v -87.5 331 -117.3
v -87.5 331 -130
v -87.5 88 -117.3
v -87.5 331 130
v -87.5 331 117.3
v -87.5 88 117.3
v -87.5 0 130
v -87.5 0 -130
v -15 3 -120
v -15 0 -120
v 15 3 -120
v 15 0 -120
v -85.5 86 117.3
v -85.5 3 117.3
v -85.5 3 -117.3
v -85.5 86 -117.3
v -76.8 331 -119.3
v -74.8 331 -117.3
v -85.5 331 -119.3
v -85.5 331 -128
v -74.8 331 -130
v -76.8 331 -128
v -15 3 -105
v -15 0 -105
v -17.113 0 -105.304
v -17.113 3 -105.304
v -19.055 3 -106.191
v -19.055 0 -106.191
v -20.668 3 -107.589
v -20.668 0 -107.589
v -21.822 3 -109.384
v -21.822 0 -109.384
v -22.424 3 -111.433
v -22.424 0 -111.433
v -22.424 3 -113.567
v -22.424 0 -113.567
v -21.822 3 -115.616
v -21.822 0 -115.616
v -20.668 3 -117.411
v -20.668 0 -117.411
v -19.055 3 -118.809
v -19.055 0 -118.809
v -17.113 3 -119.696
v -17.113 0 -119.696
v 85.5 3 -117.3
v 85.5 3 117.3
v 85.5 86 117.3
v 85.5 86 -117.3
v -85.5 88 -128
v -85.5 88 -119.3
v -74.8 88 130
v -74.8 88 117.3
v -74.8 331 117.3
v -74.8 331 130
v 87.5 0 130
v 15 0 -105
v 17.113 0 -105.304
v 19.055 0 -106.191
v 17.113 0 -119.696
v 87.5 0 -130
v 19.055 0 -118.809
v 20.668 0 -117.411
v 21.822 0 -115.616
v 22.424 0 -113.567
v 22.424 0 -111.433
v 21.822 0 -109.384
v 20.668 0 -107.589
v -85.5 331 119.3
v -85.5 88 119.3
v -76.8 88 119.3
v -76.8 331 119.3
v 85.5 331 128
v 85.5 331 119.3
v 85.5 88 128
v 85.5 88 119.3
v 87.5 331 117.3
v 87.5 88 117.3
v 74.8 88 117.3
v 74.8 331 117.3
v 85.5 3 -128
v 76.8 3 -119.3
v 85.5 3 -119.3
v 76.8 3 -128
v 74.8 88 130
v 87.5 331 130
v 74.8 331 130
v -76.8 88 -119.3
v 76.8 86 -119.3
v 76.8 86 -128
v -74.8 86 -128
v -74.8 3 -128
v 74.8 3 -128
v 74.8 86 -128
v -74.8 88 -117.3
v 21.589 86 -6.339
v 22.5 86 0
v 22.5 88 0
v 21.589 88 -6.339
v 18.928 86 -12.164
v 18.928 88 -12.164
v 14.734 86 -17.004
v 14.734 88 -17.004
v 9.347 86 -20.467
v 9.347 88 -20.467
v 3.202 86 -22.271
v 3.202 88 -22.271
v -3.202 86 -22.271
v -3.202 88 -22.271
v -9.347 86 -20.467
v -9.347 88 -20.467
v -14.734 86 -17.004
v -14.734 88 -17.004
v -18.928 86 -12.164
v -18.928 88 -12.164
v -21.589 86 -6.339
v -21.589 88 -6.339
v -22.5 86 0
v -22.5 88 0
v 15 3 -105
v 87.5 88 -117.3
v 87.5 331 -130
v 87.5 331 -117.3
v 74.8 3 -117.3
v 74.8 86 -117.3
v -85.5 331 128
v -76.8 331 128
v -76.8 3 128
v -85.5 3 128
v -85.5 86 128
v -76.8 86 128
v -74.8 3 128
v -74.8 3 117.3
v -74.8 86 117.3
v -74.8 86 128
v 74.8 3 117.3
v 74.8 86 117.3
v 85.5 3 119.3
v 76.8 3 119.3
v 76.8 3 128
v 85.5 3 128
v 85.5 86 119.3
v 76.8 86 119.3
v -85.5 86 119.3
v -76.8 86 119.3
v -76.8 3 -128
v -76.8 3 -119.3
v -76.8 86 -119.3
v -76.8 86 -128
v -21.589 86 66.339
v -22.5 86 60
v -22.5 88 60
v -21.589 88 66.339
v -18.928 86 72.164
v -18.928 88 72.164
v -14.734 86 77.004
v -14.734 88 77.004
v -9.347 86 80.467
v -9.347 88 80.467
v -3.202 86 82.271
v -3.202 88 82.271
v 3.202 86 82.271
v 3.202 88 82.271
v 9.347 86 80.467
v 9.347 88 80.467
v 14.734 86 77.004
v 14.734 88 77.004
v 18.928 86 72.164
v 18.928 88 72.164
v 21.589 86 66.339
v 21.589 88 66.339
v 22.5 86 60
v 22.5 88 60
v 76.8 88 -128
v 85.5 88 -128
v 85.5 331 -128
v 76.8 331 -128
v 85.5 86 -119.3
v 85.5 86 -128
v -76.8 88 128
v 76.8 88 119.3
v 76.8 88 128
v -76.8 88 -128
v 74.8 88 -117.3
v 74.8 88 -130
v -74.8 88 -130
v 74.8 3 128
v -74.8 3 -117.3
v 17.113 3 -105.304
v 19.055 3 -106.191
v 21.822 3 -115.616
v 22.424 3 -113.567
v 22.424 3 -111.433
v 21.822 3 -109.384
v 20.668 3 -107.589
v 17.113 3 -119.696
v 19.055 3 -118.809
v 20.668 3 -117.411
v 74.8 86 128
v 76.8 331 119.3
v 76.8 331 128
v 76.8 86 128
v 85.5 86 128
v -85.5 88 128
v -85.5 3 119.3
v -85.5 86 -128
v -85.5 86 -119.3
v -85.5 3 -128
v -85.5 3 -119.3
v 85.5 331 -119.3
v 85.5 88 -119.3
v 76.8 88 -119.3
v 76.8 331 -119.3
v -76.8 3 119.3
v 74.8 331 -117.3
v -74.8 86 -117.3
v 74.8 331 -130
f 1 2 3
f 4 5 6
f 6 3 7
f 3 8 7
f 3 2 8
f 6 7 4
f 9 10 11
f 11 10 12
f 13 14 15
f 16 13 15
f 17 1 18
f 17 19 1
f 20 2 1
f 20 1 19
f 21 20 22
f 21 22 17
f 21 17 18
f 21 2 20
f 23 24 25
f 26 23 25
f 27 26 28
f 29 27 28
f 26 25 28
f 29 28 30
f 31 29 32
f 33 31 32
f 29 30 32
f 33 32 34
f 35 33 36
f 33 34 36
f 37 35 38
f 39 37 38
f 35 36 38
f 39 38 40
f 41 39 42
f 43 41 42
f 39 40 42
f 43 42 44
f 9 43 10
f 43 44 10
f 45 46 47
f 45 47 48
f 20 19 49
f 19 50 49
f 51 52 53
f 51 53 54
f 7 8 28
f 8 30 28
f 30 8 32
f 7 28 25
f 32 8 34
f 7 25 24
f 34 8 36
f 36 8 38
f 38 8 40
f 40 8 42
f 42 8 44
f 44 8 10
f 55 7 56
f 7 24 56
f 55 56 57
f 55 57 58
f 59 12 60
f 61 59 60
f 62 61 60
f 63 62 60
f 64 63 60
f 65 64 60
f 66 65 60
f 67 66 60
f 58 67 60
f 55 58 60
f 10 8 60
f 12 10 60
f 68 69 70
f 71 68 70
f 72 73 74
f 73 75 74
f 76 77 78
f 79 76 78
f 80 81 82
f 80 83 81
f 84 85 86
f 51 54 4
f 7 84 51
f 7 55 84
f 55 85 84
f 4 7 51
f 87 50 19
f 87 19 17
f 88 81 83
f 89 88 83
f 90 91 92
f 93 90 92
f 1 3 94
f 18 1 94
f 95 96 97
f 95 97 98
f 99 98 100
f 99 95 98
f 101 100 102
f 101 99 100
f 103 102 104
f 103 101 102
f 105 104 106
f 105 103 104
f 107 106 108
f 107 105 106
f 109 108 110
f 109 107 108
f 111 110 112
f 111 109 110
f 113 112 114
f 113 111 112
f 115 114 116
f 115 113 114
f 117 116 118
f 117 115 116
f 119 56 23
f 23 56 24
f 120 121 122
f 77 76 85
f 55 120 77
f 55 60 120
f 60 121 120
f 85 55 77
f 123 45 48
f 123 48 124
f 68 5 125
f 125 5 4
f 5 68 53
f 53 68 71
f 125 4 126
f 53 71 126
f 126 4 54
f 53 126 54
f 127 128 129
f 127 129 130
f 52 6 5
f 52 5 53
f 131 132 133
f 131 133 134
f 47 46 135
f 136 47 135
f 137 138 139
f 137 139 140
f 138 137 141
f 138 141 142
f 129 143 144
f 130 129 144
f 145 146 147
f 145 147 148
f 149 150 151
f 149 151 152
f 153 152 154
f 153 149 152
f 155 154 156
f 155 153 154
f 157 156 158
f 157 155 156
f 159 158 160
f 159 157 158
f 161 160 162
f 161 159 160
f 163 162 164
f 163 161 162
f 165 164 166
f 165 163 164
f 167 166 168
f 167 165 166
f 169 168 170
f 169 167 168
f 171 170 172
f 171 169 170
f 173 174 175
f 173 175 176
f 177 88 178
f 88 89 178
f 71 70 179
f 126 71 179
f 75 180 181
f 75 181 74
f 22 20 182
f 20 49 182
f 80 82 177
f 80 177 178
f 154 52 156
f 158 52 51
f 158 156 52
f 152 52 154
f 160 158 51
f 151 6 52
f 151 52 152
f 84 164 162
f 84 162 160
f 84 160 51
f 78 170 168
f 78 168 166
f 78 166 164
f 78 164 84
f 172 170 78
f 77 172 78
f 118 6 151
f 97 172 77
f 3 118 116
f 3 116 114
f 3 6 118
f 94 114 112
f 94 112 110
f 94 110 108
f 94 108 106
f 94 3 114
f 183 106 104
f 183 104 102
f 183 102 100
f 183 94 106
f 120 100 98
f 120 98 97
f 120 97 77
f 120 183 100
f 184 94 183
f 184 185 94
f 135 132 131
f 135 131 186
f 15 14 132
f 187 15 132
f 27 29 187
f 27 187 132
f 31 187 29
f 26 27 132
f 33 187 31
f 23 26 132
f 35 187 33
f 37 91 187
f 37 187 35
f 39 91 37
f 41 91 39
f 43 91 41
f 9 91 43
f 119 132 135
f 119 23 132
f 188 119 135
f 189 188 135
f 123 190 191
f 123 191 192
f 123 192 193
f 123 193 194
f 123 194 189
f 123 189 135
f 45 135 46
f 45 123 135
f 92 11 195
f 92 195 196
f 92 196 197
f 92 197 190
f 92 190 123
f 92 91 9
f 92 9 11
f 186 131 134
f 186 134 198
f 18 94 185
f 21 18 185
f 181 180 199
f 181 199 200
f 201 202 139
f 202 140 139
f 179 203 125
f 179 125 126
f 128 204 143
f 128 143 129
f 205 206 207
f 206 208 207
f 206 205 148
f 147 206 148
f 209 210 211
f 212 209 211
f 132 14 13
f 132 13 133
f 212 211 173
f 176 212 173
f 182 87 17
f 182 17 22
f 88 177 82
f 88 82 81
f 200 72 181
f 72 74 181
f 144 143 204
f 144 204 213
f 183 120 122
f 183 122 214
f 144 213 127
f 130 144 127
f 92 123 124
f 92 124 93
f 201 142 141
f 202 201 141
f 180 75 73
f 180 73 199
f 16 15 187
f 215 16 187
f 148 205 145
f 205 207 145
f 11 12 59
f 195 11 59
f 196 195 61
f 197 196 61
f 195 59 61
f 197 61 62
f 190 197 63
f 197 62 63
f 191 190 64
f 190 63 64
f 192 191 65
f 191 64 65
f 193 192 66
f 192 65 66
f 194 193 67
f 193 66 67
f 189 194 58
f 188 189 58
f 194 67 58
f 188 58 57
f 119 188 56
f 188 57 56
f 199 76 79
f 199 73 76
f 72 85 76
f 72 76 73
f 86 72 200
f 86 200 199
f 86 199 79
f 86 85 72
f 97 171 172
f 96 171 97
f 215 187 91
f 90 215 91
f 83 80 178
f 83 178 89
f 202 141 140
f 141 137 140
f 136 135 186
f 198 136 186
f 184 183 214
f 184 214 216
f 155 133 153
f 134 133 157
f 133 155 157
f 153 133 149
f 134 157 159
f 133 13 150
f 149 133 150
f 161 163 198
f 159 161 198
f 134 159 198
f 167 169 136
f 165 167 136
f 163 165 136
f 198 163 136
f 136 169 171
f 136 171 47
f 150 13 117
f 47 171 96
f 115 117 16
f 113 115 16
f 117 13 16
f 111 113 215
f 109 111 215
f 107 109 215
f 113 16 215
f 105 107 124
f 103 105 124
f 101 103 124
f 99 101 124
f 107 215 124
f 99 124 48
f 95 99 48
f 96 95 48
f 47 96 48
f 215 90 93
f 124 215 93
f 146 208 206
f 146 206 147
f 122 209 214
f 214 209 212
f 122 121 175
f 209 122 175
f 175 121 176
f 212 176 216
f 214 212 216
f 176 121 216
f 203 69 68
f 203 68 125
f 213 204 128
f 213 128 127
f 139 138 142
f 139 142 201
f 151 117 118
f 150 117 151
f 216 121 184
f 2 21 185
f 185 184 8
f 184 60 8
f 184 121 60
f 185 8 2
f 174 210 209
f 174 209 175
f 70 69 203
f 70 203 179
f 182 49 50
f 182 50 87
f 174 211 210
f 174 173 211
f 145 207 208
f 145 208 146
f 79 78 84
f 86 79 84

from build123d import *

# Parameters (mm, degrees)
SKETCH1_W                 = 175
SKETCH1_H                 = 260
BOSS_EXTRUDE1_DEPTH       = 3
SKETCH3_W                 = 12.7
SKETCH3_H                 = 12.7
SKETCH3_W_2               = 8.7
SKETCH3_H_2               = 8.7
EXTRUDE_THIN1_DEPTH       = 328
MIRROR2_COPY_1_SKETCH_W   = 12.7
MIRROR2_COPY_1_SKETCH_H   = 12.7
MIRROR2_COPY_1_SKETCH_W_2 = 8.7
MIRROR2_COPY_1_SKETCH_H_2 = 8.7
MIRROR2_COPY_1_DEPTH      = 328
SKETCH5_W                 = 175
SKETCH5_H                 = 260
SKETCH5_W_2               = 171
SKETCH5_H_2               = 256
EXTRUDE_THIN2_DEPTH       = 83
SKETCH6_W                 = 175
SKETCH6_H                 = 260
BOSS_EXTRUDE2_DEPTH       = 2
SKETCH8_R                 = 22.5
CUT_EXTRUDE1_DEPTH        = 364.51100396
SKETCH9_R                 = 7.5
CUT_EXTRUDE2_DEPTH        = 3


with BuildPart() as part:
    # Sketch1 → Boss-Extrude1 (new body)
    with BuildSketch(Plane(origin=(0, 0, 0), x_dir=(1, 0, 0), z_dir=(0, 1, 0))):
        Rectangle(SKETCH1_W, SKETCH1_H)
    extrude(amount=BOSS_EXTRUDE1_DEPTH)

    # Sketch3 → Extrude-Thin1 (add)
    with BuildSketch(Plane(origin=(0, 3, 0), x_dir=(1, 0, 0), z_dir=(0, 1, 0))):
        with Locations((-81.15, 123.65)):
            Rectangle(SKETCH3_W, SKETCH3_H)
        with Locations((-81.15, 123.65)):
            Rectangle(SKETCH3_W_2, SKETCH3_H_2, mode=Mode.SUBTRACT)
    extrude_thin1 = extrude(amount=EXTRUDE_THIN1_DEPTH)

    # Mirror1: Extrude-Thin1 across plane
    add(extrude_thin1.mirror(Plane(origin=(0, 0, 0), x_dir=(0, 0, 1), z_dir=(1, 0, 0))))

    # Mirror2: Extrude-Thin1 across plane
    add(extrude_thin1.mirror(Plane.XY))

    # Mirror2 copy 1 sketch → Mirror2 copy 1 (add)
    with BuildSketch(Plane(origin=(0, 3, 0), x_dir=(-1, 0, 0), z_dir=(0, 1, 0))):
        with Locations((-81.15, 123.65)):
            Rectangle(MIRROR2_COPY_1_SKETCH_W, MIRROR2_COPY_1_SKETCH_H)
        with Locations((-81.15, 123.65)):
            Rectangle(MIRROR2_COPY_1_SKETCH_W_2, MIRROR2_COPY_1_SKETCH_H_2, mode=Mode.SUBTRACT)
    extrude(amount=MIRROR2_COPY_1_DEPTH)

    # Sketch5 → Extrude-Thin2 (add)
    with BuildSketch(Plane(origin=(0, 3, 0), x_dir=(1, 0, 0), z_dir=(0, 1, 0))):
        Rectangle(SKETCH5_W, SKETCH5_H)
        Rectangle(SKETCH5_W_2, SKETCH5_H_2, mode=Mode.SUBTRACT)
    extrude(amount=EXTRUDE_THIN2_DEPTH)

    # Sketch6 → Boss-Extrude2 (add)
    with BuildSketch(Plane(origin=(0, 86, 0), x_dir=(1, 0, 0), z_dir=(0, 1, 0))):
        Rectangle(SKETCH6_W, SKETCH6_H)
    extrude(amount=BOSS_EXTRUDE2_DEPTH)

    # Sketch8 → Cut-Extrude1 (cut, through all)
    with BuildSketch(Plane(origin=(0, 3, 0), x_dir=(1, 0, 0), z_dir=(0, 1, 0))):
        with Locations((0, -60)):
            Circle(SKETCH8_R)
        with BuildLine():
            ThreePointArc((22.5, 0), (0, -22.5), (-22.5, 0))
            Line((-22.5, 0), (-22.5, -60))
            ThreePointArc((-22.5, -60), (0, -37.5), (22.5, -60))
            Line((22.5, -60), (22.5, 0))
        make_face()
        Circle(SKETCH8_R)
    extrude(amount=CUT_EXTRUDE1_DEPTH, mode=Mode.SUBTRACT)

    # Sketch9 → Cut-Extrude2 (cut)
    with BuildSketch(Plane.XZ):
        with Locations((-15, -112.5)):
            Circle(SKETCH9_R)
        with BuildLine():
            Line((15, -105), (-15, -105))
            ThreePointArc((-15, -105), (-9.696699141, -107.196699141), (-7.5, -112.5))
            ThreePointArc((-7.5, -112.5), (-9.696699141, -117.803300859), (-15, -120))
            Line((-15, -120), (15, -120))
            ThreePointArc((15, -120), (7.5, -112.5), (15, -105))
        make_face()
        with Locations((15, -112.5)):
            Circle(SKETCH9_R)
    extrude(amount=-CUT_EXTRUDE2_DEPTH, mode=Mode.SUBTRACT)


solid = part.part
